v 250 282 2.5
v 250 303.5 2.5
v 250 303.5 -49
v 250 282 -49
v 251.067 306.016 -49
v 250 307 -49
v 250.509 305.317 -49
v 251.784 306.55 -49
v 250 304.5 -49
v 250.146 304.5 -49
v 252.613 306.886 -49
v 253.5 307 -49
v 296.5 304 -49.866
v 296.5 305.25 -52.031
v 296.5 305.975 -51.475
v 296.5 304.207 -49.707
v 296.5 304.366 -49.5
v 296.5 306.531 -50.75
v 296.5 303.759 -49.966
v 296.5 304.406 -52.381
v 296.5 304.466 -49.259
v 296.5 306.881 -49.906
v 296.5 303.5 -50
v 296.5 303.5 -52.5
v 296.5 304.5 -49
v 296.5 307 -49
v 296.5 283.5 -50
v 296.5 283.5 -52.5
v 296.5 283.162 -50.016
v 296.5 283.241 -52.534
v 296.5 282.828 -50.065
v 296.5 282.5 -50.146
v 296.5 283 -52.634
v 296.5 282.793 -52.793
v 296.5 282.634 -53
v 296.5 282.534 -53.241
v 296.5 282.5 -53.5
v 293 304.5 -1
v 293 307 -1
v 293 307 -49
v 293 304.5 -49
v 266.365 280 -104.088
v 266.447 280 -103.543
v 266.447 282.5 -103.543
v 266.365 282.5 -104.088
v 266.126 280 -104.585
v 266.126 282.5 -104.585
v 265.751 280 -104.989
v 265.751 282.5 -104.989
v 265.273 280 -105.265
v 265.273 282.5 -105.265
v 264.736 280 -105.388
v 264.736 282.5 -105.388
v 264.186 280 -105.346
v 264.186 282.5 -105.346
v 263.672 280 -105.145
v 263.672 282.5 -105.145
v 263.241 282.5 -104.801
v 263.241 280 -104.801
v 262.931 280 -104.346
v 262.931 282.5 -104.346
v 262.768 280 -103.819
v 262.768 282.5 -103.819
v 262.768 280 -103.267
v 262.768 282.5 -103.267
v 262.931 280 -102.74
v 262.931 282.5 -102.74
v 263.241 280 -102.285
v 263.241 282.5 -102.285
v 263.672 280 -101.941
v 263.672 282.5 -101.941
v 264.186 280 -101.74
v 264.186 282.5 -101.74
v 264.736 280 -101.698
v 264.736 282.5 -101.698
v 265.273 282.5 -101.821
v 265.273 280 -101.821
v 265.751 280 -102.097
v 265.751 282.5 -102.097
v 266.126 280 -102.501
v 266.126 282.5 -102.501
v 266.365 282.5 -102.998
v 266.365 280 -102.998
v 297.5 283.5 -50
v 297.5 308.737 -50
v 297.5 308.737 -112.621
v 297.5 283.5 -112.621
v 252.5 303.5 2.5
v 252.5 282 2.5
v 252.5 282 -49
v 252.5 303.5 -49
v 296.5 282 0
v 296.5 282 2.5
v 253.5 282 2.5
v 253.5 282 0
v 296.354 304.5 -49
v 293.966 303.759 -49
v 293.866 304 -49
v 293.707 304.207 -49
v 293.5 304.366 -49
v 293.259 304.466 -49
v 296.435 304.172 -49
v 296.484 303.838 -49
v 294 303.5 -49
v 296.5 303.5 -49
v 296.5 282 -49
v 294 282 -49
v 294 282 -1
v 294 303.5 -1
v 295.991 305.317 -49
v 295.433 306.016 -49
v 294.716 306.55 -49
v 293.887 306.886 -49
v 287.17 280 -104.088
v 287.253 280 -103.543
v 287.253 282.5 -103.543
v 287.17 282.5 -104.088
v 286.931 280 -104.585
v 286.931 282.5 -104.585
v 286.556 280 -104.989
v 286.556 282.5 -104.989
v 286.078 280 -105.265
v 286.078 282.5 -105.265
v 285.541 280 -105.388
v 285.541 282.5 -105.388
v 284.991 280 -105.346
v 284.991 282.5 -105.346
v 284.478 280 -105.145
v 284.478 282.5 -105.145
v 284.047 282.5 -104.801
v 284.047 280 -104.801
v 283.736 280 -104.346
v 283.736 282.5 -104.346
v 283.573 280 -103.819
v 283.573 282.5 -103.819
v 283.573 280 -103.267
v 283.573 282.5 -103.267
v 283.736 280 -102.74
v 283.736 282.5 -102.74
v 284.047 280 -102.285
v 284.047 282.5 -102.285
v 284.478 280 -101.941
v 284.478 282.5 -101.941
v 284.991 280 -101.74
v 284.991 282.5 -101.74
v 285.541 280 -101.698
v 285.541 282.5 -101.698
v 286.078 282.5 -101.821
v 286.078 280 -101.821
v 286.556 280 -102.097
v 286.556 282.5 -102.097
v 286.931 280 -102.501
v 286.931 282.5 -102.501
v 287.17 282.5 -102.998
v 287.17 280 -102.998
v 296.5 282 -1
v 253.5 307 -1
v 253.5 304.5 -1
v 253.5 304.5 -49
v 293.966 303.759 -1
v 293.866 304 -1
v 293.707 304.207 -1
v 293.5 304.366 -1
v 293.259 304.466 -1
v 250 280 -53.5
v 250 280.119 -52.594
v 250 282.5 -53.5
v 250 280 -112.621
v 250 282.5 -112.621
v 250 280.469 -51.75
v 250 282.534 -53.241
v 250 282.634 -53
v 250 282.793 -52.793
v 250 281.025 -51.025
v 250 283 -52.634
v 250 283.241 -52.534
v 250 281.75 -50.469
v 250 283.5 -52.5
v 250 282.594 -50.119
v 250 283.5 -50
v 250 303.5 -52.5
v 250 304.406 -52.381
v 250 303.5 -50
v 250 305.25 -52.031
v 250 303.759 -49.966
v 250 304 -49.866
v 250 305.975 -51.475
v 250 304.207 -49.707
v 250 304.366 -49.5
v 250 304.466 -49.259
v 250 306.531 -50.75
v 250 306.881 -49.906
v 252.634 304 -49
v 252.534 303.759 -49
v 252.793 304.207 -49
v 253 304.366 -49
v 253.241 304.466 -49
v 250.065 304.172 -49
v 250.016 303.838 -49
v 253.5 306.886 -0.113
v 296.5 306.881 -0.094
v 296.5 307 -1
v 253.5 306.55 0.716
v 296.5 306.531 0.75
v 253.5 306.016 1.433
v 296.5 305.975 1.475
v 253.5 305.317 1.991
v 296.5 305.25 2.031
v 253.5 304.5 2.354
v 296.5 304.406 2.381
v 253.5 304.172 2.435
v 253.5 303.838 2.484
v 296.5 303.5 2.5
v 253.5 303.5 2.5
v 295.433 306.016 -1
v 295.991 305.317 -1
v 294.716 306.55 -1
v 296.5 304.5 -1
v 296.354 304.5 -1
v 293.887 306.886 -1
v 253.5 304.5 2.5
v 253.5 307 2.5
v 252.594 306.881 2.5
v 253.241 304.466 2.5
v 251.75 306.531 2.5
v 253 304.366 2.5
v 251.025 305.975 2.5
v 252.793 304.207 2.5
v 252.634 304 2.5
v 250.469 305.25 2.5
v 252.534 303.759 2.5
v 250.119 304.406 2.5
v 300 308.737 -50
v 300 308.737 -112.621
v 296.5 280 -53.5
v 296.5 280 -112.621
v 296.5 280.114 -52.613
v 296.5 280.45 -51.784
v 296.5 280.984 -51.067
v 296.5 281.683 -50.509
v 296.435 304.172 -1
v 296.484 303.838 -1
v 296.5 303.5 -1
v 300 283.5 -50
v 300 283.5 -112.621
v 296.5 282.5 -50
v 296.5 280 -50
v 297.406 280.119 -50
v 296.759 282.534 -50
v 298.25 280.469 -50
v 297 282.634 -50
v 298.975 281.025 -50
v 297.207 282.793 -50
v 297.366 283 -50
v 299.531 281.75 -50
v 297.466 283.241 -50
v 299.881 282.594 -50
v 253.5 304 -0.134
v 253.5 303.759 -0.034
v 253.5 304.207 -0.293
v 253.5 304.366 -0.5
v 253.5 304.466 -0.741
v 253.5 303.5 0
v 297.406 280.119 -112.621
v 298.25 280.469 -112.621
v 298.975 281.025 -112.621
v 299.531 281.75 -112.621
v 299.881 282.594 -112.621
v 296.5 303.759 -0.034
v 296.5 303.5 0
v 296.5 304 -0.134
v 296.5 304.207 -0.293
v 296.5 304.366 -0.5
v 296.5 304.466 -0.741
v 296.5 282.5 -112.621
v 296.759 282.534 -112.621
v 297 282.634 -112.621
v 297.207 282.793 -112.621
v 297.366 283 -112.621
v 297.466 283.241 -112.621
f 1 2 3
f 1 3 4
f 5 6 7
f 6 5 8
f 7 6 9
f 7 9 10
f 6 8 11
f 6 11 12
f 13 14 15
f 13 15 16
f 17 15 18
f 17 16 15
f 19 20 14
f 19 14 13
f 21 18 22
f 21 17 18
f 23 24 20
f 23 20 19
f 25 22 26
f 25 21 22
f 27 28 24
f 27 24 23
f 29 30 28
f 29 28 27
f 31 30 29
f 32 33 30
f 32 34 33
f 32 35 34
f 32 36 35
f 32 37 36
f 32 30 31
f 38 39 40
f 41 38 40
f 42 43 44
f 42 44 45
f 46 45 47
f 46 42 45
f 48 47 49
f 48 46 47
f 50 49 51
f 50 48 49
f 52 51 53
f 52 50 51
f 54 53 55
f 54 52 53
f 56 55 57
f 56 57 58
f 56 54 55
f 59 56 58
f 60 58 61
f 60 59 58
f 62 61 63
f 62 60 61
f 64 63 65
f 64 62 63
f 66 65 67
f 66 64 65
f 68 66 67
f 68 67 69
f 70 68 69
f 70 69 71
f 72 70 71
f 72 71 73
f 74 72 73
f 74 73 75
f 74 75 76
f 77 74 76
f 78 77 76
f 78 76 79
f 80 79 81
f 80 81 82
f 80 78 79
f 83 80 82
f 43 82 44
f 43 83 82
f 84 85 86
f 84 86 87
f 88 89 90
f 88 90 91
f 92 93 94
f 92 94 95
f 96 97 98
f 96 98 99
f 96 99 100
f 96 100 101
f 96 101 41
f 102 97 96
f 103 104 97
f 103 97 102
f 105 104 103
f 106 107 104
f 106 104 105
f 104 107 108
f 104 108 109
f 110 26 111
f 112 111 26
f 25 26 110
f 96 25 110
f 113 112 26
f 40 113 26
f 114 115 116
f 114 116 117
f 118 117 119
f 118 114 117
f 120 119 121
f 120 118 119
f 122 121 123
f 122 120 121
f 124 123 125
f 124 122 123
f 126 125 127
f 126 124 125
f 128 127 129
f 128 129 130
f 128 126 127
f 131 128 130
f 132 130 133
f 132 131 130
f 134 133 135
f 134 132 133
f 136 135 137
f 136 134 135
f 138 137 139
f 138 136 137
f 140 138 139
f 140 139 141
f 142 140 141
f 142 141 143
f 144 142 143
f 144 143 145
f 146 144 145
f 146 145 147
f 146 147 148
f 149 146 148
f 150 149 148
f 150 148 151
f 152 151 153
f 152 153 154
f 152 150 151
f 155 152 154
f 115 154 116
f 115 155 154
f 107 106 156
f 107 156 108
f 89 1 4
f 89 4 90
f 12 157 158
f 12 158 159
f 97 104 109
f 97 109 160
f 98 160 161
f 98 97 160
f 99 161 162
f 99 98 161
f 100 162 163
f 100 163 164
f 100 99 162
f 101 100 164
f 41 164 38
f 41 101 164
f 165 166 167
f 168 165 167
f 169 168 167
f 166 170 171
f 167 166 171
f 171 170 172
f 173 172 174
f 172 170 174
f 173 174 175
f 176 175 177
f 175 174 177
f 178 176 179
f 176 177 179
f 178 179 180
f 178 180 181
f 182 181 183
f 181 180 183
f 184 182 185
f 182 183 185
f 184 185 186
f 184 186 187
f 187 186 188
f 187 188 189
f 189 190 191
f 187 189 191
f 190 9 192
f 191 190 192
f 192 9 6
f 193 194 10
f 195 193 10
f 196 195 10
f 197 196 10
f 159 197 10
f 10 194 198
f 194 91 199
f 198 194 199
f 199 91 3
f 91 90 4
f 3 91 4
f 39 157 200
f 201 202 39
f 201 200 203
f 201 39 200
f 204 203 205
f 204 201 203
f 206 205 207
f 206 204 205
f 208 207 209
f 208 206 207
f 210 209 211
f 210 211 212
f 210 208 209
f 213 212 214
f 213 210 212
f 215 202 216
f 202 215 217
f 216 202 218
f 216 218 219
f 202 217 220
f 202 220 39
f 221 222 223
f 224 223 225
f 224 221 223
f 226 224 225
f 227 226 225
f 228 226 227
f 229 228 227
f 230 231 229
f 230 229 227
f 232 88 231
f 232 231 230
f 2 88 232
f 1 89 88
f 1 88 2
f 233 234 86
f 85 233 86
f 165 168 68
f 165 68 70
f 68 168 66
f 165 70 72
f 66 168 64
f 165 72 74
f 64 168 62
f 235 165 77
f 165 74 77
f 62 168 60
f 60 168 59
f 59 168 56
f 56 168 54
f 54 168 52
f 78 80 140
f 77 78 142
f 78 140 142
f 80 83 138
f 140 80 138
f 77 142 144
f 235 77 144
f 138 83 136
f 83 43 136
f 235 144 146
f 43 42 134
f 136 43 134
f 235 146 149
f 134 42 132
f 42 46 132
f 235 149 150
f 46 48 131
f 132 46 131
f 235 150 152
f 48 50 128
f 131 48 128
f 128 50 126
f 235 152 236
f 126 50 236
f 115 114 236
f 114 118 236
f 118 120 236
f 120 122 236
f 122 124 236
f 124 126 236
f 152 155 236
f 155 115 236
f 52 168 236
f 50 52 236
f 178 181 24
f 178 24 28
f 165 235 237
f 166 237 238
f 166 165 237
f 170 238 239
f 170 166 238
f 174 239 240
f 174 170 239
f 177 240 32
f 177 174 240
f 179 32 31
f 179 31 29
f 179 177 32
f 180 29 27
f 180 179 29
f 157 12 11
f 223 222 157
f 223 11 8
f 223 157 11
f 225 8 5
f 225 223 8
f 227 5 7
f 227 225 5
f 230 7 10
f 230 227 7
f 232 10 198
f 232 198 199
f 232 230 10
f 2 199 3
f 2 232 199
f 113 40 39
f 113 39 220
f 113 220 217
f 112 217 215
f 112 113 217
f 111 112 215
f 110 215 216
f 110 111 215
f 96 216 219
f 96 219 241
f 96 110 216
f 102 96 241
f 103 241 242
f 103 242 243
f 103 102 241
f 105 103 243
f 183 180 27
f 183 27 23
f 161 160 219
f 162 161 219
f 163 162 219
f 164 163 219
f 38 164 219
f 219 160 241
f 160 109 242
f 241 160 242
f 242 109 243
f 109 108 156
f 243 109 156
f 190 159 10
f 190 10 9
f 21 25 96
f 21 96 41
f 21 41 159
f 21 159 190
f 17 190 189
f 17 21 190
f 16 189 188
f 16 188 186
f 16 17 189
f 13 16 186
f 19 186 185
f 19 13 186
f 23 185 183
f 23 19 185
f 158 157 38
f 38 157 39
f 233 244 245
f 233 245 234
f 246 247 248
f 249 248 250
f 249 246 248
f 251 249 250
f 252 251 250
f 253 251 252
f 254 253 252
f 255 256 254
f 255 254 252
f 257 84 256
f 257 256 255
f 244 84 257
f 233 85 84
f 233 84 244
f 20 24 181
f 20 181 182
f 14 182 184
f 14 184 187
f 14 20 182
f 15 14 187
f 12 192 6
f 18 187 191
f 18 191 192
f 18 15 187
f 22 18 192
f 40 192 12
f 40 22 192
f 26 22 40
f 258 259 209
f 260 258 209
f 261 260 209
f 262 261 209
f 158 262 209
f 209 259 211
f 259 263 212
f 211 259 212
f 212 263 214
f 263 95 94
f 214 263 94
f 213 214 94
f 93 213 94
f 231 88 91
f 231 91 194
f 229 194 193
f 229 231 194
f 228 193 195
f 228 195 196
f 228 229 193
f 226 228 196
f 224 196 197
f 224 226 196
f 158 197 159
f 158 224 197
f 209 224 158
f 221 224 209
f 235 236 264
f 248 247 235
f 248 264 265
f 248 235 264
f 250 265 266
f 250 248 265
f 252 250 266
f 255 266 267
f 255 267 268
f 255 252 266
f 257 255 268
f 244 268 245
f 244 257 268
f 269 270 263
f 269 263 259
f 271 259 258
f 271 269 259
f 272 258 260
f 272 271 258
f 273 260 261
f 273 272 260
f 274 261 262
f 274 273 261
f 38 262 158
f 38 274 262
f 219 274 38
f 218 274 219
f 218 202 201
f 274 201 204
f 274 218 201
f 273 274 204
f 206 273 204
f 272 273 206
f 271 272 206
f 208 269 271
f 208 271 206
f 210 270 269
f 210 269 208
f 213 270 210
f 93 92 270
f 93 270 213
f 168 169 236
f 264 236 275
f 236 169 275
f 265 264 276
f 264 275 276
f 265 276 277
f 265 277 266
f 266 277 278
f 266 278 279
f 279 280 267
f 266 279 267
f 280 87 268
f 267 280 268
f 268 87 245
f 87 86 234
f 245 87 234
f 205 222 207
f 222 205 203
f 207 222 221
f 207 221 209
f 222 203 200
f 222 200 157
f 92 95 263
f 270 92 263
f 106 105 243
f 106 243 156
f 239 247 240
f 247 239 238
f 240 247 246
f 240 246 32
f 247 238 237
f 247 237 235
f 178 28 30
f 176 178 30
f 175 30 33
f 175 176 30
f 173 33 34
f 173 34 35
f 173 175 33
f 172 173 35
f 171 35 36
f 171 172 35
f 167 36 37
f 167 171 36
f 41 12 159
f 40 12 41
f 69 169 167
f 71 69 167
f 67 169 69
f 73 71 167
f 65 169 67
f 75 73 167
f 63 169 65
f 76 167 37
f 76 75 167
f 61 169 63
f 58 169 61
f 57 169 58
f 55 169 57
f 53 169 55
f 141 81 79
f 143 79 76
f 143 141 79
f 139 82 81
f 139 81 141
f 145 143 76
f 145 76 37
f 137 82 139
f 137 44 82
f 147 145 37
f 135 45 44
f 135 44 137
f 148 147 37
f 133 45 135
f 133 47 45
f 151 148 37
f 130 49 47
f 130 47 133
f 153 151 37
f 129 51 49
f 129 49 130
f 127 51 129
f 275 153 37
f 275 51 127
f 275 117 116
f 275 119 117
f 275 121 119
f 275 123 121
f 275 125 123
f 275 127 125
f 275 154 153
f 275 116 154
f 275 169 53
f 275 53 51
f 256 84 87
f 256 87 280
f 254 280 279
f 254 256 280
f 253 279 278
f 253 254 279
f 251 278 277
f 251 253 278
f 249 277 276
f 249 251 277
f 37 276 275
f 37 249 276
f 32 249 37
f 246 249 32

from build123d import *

# Parameters (mm, degrees)
BASE_FLANGE1_OUTLINE_W       = 50
BASE_FLANGE1_OUTLINE_H       = 62.620541263
BASE_FLANGE1_OUTLINE_R       = 1.849849123
BASE_FLANGE1_DEPTH           = 2.5
EDGE_FLANGE1_STRIP_W         = 12
EDGE_FLANGE1_STRIP_H         = 2.5
EDGE_FLANGE1_STRIP_CUT_DEPTH = 62.620541263
EDGE_FLANGE1_DEPTH           = 62.620541263
EDGE_FLANGE2_STRIP_W         = 12
EDGE_FLANGE2_STRIP_H         = 2.5
EDGE_FLANGE2_STRIP_CUT_DEPTH = 46.5
EDGE_FLANGE2_DEPTH           = 46.5
EDGE_FLANGE4_STRIP_W         = 12
EDGE_FLANGE4_STRIP_H         = 2.5
EDGE_FLANGE4_STRIP_CUT_DEPTH = 46.5
EDGE_FLANGE4_DEPTH           = 46.5
EDGE_FLANGE5_STRIP_W         = 12
EDGE_FLANGE5_STRIP_H         = 2.5
EDGE_FLANGE5_STRIP_CUT_DEPTH = 51.5
EDGE_FLANGE5_DEPTH           = 51.5
EDGE_FLANGE6_STRIP_W         = 12
EDGE_FLANGE6_STRIP_H         = 2.5
EDGE_FLANGE6_STRIP_CUT_DEPTH = 43
EDGE_FLANGE6_DEPTH           = 43
EDGE_FLANGE7_STRIP_W         = 12
EDGE_FLANGE7_STRIP_H         = 2.5
EDGE_FLANGE7_STRIP_CUT_DEPTH = 48
EDGE_FLANGE7_DEPTH           = 48
SKETCH31_W                   = 39.5
SKETCH31_H                   = 48
CUT_EXTRUDE1_DEPTH           = 4


# Read off the part's stored shape, not the designer's step: Base-Flange1
# Sheet-metal steps are written as plain solids
with BuildPart() as part:
    # Base-Flange1 outline → Base-Flange1 (new body)
    with BuildSketch(Plane(origin=(0, 280, 0), x_dir=(1, 0, 0), z_dir=(0, 1, 0))):
        with Locations((275, 81.310270632)):
            Rectangle(BASE_FLANGE1_OUTLINE_W, BASE_FLANGE1_OUTLINE_H)
        with Locations((264.597334147, 103.542995429)):
            Circle(BASE_FLANGE1_OUTLINE_R, mode=Mode.SUBTRACT)
        with Locations((285.402665853, 103.542995429)):
            Circle(BASE_FLANGE1_OUTLINE_R, mode=Mode.SUBTRACT)
    extrude(amount=BASE_FLANGE1_DEPTH)

    # Edge-Flange1 strip (across the edge) → Edge-Flange1 strip cut (cut)
    with BuildSketch(Plane(origin=(300, 282.5, -50), x_dir=(-1, 0, 0), z_dir=(0, 0, -1))):
        with Locations((-2.5, -1.25)):
            Rectangle(EDGE_FLANGE1_STRIP_W, EDGE_FLANGE1_STRIP_H)
    extrude(amount=EDGE_FLANGE1_STRIP_CUT_DEPTH, mode=Mode.SUBTRACT)

    # Edge-Flange1 section (across the edge) → Edge-Flange1 (add)
    with BuildSketch(Plane(origin=(300, 282.5, -50), x_dir=(-1, 0, 0), z_dir=(0, 0, -1))):
        with BuildLine():
            Line((0, 1), (0, 26.2366))
            Line((0, 26.2366), (2.5, 26.2366))
            Line((2.5, 26.2366), (2.5, 1))
            ThreePointArc((2.5, 1), (2.792893219, 0.292893219), (3.5, 0))
            Line((3.5, 0), (3.5, -2.5))
            ThreePointArc((3.5, -2.5), (1.025126266, -1.474873734), (0, 1))
        make_face()
    extrude(amount=EDGE_FLANGE1_DEPTH)

    # Edge-Flange2 strip (across the edge) → Edge-Flange2 strip cut (cut)
    with BuildSketch(Plane(origin=(250, 282.5, -50), x_dir=(0, 0, -1), z_dir=(1, 0, 0))):
        with Locations((-2.5, -1.25)):
            Rectangle(EDGE_FLANGE2_STRIP_W, EDGE_FLANGE2_STRIP_H)
    extrude(amount=EDGE_FLANGE2_STRIP_CUT_DEPTH, mode=Mode.SUBTRACT)

    # Edge-Flange2 section (across the edge) → Edge-Flange2 (add)
    with BuildSketch(Plane(origin=(250, 282.5, -50), x_dir=(0, 0, -1), z_dir=(1, 0, 0))):
        with BuildLine():
            Line((0, 1), (0, 24.5))
            Line((0, 24.5), (2.5, 24.5))
            Line((2.5, 24.5), (2.5, 1))
            ThreePointArc((2.5, 1), (2.792893219, 0.292893219), (3.5, 0))
            Line((3.5, 0), (3.5, -2.5))
            ThreePointArc((3.5, -2.5), (1.025126266, -1.474873734), (0, 1))
        make_face()
    extrude(amount=EDGE_FLANGE2_DEPTH)

    # Edge-Flange4 strip (across the edge) → Edge-Flange4 strip cut (cut)
    with BuildSketch(Plane(origin=(296.5, 307, -50), x_dir=(0, -1, 0), z_dir=(-1, 0, 0))):
        with Locations((-2.5, -1.25)):
            Rectangle(EDGE_FLANGE4_STRIP_W, EDGE_FLANGE4_STRIP_H)
    extrude(amount=EDGE_FLANGE4_STRIP_CUT_DEPTH, mode=Mode.SUBTRACT)

    # Edge-Flange4 section (across the edge) → Edge-Flange4 (add)
    with BuildSketch(Plane(origin=(296.5, 307, -50), x_dir=(0, -1, 0), z_dir=(-1, 0, 0))):
        with BuildLine():
            Line((0, 1), (0, 52.5))
            Line((0, 52.5), (2.5, 52.5))
            Line((2.5, 52.5), (2.5, 1))
            ThreePointArc((2.5, 1), (2.792893219, 0.292893219), (3.5, 0))
            Line((3.5, 0), (3.5, -2.5))
            ThreePointArc((3.5, -2.5), (1.025126266, -1.474873734), (0, 1))
        make_face()
    extrude(amount=EDGE_FLANGE4_DEPTH)

    # Edge-Flange5 strip (across the edge) → Edge-Flange5 strip cut (cut)
    with BuildSketch(Plane(origin=(250, 304.5, 2.5), x_dir=(1, 0, 0), z_dir=(0, 0, -1))):
        with Locations((-2.5, -1.25)):
            Rectangle(EDGE_FLANGE5_STRIP_W, EDGE_FLANGE5_STRIP_H)
    extrude(amount=EDGE_FLANGE5_STRIP_CUT_DEPTH, mode=Mode.SUBTRACT)

    # Edge-Flange5 section (across the edge) → Edge-Flange5 (add)
    with BuildSketch(Plane(origin=(250, 304.5, 2.5), x_dir=(1, 0, 0), z_dir=(0, 0, -1))):
        with BuildLine():
            Line((0, 1), (0, 22.5))
            Line((0, 22.5), (2.5, 22.5))
            Line((2.5, 22.5), (2.5, 1))
            ThreePointArc((2.5, 1), (2.792893219, 0.292893219), (3.5, 0))
            Line((3.5, 0), (3.5, -2.5))
            ThreePointArc((3.5, -2.5), (1.025126266, -1.474873734), (0, 1))
        make_face()
    extrude(amount=EDGE_FLANGE5_DEPTH)

    # Edge-Flange6 strip (across the edge) → Edge-Flange6 strip cut (cut)
    with BuildSketch(Plane(origin=(296.5, 304.5, 2.5), x_dir=(0, 0, -1), z_dir=(-1, 0, 0))):
        with Locations((-2.5, -1.25)):
            Rectangle(EDGE_FLANGE6_STRIP_W, EDGE_FLANGE6_STRIP_H)
    extrude(amount=EDGE_FLANGE6_STRIP_CUT_DEPTH, mode=Mode.SUBTRACT)

    # Edge-Flange6 section (across the edge) → Edge-Flange6 (add)
    with BuildSketch(Plane(origin=(296.5, 304.5, 2.5), x_dir=(0, 0, -1), z_dir=(-1, 0, 0))):
        with BuildLine():
            Line((0, 1), (0, 22.5))
            Line((0, 22.5), (2.5, 22.5))
            Line((2.5, 22.5), (2.5, 1))
            ThreePointArc((2.5, 1), (2.792893219, 0.292893219), (3.5, 0))
            Line((3.5, 0), (3.5, -2.5))
            ThreePointArc((3.5, -2.5), (1.025126266, -1.474873734), (0, 1))
        make_face()
    extrude(amount=EDGE_FLANGE6_DEPTH)

    # Edge-Flange7 strip (across the edge) → Edge-Flange7 strip cut (cut)
    with BuildSketch(Plane(origin=(296.5, 304.5, -49), x_dir=(-1, 0, 0), z_dir=(0, 0, 1))):
        with Locations((-2.5, -1.25)):
            Rectangle(EDGE_FLANGE7_STRIP_W, EDGE_FLANGE7_STRIP_H)
    extrude(amount=EDGE_FLANGE7_STRIP_CUT_DEPTH, mode=Mode.SUBTRACT)

    # Edge-Flange7 section (across the edge) → Edge-Flange7 (add)
    with BuildSketch(Plane(origin=(296.5, 304.5, -49), x_dir=(-1, 0, 0), z_dir=(0, 0, 1))):
        with BuildLine():
            Line((0, 1), (0, 22.5))
            Line((0, 22.5), (2.5, 22.5))
            Line((2.5, 22.5), (2.5, 1))
            ThreePointArc((2.5, 1), (2.792893219, 0.292893219), (3.5, 0))
            Line((3.5, 0), (3.5, -2.5))
            ThreePointArc((3.5, -2.5), (1.025126266, -1.474873734), (0, 1))
        make_face()
    extrude(amount=EDGE_FLANGE7_DEPTH)

    # Sketch31 → Cut-Extrude1 (cut)
    with BuildSketch(Plane(origin=(0, 307, 0), x_dir=(1, 0, 0), z_dir=(0, 1, 0))):
        with Locations((273.25, 25)):
            Rectangle(SKETCH31_W, SKETCH31_H)
    extrude(amount=-CUT_EXTRUDE1_DEPTH, mode=Mode.SUBTRACT)


solid = part.part
